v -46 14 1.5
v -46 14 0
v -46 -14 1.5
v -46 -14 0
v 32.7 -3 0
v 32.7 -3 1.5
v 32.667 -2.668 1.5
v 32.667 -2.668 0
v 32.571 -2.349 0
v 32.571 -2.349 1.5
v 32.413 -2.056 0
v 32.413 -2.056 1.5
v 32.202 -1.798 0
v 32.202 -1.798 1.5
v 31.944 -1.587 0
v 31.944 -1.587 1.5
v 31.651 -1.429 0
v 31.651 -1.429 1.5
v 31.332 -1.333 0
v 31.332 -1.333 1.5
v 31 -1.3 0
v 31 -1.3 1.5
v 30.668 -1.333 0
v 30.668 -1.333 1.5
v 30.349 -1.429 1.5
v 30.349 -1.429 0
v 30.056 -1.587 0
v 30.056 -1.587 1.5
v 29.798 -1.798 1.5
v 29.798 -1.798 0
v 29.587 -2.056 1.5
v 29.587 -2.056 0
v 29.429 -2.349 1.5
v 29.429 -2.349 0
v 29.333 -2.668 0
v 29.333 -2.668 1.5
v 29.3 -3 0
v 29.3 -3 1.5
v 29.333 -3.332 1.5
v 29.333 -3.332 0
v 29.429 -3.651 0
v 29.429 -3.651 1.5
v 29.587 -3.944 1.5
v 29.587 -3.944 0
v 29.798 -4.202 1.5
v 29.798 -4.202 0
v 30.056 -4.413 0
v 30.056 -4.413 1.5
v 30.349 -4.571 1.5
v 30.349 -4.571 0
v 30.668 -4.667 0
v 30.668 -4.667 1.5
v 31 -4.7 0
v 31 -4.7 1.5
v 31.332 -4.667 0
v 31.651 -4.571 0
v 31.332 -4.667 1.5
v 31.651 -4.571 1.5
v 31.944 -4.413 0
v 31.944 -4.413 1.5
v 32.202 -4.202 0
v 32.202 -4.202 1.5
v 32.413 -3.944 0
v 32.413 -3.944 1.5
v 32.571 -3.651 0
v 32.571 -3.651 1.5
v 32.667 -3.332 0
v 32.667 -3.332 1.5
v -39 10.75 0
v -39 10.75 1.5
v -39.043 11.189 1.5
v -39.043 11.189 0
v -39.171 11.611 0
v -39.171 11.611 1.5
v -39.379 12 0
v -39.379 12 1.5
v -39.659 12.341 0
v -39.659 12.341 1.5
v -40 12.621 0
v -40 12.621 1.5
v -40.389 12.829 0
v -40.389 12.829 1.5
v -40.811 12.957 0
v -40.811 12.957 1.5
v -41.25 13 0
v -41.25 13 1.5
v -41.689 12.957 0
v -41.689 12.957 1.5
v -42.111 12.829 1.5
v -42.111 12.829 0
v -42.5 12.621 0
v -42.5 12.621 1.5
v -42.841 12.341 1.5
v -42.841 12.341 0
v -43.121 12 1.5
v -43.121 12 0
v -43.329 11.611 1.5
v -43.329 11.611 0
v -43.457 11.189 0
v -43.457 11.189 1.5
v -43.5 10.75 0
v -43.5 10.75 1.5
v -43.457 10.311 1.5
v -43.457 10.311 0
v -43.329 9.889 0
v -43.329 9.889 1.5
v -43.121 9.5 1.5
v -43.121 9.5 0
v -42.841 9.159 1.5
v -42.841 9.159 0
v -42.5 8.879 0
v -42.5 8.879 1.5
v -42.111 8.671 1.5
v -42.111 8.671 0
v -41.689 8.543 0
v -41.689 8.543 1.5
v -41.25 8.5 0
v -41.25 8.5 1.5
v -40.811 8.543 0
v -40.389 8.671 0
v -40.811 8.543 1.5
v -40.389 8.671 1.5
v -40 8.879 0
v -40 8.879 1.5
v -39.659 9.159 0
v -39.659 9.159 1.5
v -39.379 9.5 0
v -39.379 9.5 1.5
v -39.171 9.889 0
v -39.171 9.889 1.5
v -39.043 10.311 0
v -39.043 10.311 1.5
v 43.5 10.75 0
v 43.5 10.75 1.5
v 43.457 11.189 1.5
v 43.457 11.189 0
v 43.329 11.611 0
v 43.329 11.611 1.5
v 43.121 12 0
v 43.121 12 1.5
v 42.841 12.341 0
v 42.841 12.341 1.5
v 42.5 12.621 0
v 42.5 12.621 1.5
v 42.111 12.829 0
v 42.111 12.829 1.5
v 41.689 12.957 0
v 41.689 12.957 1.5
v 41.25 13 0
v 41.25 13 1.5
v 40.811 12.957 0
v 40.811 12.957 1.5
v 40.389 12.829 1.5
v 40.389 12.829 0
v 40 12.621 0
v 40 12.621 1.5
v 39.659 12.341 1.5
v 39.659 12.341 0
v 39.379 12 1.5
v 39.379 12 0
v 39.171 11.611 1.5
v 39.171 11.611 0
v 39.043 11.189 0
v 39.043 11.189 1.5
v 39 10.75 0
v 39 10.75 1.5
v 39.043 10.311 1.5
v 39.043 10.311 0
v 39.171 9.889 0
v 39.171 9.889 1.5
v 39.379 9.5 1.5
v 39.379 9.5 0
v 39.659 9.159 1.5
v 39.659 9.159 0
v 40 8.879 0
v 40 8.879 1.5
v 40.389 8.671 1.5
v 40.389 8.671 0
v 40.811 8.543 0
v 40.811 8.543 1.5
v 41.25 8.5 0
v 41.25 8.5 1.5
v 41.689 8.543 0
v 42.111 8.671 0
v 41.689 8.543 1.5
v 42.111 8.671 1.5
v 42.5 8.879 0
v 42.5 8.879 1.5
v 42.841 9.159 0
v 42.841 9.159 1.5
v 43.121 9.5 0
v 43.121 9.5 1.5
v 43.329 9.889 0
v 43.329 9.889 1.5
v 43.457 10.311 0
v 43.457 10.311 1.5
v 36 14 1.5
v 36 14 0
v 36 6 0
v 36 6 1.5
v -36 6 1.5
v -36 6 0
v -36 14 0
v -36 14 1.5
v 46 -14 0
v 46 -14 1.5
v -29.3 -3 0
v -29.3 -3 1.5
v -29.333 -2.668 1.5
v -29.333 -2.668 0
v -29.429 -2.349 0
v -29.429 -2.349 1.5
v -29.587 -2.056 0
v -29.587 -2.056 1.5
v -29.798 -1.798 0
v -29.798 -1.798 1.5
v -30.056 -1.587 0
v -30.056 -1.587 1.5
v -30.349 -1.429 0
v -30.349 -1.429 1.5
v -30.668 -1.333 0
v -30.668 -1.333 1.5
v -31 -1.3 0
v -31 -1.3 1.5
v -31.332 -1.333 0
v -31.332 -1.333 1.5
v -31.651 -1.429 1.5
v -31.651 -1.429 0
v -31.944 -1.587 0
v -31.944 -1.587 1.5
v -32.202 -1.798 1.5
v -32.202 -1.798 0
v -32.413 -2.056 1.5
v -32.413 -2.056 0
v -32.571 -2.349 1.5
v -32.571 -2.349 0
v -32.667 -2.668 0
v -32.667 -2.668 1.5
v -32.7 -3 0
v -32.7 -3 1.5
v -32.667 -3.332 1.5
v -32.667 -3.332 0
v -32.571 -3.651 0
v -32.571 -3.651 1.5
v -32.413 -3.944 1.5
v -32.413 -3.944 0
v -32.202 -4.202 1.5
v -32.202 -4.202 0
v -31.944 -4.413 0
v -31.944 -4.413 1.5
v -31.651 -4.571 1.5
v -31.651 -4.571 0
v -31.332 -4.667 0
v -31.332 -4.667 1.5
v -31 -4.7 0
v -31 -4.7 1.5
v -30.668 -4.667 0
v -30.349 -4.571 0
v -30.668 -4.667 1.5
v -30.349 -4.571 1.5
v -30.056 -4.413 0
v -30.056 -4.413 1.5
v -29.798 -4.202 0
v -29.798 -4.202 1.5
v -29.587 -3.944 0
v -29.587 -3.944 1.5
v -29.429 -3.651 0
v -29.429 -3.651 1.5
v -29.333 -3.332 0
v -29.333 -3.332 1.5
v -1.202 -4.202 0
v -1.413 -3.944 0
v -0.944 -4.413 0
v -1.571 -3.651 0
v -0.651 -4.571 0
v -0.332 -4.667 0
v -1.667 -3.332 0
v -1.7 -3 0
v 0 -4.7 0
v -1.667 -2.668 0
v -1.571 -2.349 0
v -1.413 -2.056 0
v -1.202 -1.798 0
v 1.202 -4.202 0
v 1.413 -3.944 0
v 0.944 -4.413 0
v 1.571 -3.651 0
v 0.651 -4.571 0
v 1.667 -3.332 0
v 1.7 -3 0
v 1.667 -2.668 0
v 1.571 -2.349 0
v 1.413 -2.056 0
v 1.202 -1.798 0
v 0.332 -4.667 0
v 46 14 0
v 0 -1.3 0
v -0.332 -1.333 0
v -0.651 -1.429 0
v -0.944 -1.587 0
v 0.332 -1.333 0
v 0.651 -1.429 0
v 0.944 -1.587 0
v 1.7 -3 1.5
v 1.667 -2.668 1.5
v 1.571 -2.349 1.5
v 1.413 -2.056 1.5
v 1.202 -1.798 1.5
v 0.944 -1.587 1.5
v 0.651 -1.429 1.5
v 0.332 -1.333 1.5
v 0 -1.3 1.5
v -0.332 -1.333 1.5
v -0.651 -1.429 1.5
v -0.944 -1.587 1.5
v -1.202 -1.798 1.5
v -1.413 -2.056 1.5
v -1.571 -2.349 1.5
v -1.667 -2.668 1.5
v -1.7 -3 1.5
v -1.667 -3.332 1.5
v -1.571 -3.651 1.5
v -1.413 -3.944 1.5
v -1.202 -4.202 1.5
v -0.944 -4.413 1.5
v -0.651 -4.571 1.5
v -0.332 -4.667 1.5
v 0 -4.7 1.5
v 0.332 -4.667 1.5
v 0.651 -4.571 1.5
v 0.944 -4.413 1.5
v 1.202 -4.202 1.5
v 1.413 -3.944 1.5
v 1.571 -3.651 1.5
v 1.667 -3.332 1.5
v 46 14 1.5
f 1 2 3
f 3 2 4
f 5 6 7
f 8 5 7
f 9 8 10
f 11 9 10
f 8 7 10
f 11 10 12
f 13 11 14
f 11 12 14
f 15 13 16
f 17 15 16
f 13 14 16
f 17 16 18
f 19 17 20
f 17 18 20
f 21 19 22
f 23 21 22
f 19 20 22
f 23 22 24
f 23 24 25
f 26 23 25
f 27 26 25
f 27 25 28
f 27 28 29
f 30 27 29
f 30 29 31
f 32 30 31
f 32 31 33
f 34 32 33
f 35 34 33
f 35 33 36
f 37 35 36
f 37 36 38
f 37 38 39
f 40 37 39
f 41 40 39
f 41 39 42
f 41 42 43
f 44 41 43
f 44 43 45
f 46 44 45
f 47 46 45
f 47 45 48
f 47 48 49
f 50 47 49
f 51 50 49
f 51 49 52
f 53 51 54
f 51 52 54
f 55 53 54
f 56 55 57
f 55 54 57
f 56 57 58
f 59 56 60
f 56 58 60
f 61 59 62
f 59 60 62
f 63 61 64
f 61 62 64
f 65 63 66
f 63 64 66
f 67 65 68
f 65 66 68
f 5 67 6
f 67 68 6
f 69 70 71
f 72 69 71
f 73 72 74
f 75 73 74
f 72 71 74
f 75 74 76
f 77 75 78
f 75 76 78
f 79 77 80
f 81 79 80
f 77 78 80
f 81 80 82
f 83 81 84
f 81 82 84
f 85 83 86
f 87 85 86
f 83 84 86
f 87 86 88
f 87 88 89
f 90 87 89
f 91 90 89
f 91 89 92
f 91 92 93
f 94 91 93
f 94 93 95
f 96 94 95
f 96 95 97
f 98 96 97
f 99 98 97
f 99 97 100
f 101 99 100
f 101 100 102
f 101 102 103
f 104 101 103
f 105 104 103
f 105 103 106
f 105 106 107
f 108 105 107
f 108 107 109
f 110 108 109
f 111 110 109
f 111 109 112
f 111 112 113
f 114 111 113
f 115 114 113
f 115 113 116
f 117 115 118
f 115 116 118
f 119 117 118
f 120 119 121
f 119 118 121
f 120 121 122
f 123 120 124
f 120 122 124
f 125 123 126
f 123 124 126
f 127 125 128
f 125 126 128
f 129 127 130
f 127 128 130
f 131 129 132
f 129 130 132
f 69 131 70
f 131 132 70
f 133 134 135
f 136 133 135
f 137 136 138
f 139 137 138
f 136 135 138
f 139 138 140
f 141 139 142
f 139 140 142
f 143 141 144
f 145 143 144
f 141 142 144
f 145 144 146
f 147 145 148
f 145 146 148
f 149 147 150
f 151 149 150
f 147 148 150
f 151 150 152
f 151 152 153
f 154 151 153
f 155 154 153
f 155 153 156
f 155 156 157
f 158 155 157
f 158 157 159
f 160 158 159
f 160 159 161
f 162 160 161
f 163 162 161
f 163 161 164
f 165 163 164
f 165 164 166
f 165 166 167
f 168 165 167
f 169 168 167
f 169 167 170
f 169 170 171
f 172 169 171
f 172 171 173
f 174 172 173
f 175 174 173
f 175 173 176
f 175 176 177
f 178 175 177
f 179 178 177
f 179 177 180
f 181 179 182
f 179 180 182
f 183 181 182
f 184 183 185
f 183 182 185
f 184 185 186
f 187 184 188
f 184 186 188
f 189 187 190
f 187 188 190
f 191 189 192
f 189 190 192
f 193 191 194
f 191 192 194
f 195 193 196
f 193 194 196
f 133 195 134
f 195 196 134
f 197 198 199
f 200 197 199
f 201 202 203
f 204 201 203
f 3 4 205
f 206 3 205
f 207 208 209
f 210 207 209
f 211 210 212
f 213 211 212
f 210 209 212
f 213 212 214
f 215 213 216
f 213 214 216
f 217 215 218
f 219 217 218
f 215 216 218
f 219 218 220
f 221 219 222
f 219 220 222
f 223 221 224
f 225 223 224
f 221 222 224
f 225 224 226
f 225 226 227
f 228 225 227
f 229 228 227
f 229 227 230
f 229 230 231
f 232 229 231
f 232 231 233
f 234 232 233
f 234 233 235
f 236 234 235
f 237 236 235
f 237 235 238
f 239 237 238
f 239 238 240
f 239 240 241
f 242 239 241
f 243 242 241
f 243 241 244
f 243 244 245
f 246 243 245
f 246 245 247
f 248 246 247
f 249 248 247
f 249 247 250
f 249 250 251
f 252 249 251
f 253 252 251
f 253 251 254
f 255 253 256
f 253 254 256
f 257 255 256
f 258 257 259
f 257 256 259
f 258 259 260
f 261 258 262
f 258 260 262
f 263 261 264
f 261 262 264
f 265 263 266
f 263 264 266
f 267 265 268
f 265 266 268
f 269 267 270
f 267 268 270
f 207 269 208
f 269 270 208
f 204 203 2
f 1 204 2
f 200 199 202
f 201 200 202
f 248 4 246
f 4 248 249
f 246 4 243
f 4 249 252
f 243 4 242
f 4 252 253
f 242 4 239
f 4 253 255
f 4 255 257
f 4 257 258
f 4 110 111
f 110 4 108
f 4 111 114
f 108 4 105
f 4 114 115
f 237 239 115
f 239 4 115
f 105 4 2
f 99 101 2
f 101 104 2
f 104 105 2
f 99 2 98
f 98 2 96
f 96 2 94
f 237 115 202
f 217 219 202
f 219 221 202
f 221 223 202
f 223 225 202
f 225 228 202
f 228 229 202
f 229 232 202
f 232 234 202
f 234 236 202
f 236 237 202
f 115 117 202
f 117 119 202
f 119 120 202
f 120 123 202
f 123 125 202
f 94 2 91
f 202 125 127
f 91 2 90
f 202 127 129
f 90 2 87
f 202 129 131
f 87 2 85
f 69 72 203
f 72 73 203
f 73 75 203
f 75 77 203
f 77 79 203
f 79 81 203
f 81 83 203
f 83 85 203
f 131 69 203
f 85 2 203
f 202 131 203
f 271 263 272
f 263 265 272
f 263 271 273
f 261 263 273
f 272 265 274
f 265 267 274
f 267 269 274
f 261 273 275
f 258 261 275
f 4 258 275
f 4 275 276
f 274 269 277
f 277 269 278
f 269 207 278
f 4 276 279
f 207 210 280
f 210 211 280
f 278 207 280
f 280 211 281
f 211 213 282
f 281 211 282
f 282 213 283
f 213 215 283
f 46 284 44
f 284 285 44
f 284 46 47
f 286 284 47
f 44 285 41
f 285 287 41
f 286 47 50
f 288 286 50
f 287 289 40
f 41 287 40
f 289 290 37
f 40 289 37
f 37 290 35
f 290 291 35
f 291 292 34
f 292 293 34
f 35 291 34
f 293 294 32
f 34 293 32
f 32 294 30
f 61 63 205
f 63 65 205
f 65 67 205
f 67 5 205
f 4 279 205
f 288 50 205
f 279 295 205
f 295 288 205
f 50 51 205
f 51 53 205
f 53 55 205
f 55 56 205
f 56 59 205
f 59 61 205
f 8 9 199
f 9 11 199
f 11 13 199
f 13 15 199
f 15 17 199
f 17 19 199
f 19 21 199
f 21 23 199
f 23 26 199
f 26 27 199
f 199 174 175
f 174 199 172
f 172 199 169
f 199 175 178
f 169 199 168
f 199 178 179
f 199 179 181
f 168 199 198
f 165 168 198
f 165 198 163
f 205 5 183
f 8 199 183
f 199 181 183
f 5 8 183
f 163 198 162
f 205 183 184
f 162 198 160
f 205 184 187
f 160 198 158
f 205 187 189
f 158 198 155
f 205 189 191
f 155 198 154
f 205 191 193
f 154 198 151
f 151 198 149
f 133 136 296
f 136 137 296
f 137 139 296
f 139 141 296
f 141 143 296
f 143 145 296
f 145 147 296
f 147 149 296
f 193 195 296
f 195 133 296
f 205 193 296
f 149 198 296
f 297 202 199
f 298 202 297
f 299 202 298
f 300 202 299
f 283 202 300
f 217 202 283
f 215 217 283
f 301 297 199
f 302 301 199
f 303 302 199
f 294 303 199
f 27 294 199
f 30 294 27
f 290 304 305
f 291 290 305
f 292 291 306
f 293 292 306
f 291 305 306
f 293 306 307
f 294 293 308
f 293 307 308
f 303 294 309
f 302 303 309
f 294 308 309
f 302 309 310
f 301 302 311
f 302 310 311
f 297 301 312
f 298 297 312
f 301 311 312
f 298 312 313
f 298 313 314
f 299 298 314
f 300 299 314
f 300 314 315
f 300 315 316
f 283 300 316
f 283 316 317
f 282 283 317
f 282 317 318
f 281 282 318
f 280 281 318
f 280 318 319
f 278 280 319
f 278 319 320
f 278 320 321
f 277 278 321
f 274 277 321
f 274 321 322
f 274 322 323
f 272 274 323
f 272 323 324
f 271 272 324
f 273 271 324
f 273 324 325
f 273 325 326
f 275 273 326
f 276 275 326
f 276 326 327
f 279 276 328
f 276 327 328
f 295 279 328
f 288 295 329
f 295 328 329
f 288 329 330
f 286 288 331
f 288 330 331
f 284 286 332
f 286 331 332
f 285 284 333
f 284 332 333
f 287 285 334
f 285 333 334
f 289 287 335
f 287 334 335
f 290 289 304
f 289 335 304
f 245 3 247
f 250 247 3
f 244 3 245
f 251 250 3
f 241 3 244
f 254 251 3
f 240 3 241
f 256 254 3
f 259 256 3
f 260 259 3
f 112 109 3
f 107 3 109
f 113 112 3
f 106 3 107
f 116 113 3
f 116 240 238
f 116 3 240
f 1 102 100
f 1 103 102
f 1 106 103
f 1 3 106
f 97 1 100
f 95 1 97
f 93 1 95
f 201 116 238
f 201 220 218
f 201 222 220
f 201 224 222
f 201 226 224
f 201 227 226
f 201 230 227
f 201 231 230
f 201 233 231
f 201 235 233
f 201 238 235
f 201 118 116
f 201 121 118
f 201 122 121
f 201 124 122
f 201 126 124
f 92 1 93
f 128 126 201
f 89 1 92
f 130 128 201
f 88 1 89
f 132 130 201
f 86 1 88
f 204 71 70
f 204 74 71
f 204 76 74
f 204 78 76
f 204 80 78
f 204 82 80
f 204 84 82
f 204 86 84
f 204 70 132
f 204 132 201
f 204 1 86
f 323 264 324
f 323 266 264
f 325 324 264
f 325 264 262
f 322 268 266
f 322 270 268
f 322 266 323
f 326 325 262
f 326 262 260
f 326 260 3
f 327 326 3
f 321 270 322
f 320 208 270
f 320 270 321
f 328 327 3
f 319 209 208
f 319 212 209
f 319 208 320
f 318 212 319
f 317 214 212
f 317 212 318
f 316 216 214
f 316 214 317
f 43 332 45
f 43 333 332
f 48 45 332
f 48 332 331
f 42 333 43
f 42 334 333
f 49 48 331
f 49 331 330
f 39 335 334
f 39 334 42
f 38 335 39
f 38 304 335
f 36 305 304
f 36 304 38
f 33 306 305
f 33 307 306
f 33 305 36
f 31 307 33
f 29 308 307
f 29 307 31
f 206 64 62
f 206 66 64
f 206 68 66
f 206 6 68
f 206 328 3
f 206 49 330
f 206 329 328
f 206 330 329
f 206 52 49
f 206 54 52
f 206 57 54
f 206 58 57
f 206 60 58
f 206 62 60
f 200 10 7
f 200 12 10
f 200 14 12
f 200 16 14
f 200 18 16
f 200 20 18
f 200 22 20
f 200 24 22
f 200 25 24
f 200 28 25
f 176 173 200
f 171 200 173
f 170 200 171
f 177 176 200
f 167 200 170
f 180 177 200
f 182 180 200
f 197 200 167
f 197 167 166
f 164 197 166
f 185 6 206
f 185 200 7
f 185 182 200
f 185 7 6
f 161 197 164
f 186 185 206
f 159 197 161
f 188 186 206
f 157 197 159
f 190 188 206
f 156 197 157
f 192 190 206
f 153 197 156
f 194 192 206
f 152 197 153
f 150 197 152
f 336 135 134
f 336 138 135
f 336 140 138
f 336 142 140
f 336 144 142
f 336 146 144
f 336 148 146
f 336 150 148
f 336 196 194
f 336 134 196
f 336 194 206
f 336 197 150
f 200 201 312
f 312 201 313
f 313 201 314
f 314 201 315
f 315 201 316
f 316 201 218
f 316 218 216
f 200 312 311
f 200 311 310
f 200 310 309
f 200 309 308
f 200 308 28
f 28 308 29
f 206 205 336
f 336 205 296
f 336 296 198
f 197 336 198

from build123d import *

# Parameters (mm, degrees)
PAD_DEPTH     = 1.5
SKETCH001_R   = 1.7
HOLE_DEPTH    = 25
SKETCH002_R   = 2.25
HOLE001_DEPTH = 25


with BuildPart() as part:
    # Sketch → Pad (new body)
    with BuildSketch(Plane.XY):
        Polygon((-36, 14), (-46, 14), (-46, -14), (46, -14), (46, 14), (36, 14), (36, 6), (-36, 6), align=None)
    extrude(amount=PAD_DEPTH)

    # Sketch001 (on Face10 of Pad) → Hole (cut)
    with BuildSketch(Plane.XY.offset(1.5)):
        with Locations((31, -3)):
            Circle(SKETCH001_R)
        with Locations((0, -3)):
            Circle(SKETCH001_R)
        with Locations((-31, -3)):
            Circle(SKETCH001_R)
    extrude(amount=-HOLE_DEPTH, mode=Mode.SUBTRACT)

    # Sketch002 (on Face5 of Hole) → Hole001 (cut)
    with BuildSketch(Plane.XY.offset(1.5)):
        with Locations((-41.25, 10.75)):
            Circle(SKETCH002_R)
        with Locations((41.25, 10.75)):
            Circle(SKETCH002_R)
    extrude(amount=-HOLE001_DEPTH, mode=Mode.SUBTRACT)


solid = part.part
